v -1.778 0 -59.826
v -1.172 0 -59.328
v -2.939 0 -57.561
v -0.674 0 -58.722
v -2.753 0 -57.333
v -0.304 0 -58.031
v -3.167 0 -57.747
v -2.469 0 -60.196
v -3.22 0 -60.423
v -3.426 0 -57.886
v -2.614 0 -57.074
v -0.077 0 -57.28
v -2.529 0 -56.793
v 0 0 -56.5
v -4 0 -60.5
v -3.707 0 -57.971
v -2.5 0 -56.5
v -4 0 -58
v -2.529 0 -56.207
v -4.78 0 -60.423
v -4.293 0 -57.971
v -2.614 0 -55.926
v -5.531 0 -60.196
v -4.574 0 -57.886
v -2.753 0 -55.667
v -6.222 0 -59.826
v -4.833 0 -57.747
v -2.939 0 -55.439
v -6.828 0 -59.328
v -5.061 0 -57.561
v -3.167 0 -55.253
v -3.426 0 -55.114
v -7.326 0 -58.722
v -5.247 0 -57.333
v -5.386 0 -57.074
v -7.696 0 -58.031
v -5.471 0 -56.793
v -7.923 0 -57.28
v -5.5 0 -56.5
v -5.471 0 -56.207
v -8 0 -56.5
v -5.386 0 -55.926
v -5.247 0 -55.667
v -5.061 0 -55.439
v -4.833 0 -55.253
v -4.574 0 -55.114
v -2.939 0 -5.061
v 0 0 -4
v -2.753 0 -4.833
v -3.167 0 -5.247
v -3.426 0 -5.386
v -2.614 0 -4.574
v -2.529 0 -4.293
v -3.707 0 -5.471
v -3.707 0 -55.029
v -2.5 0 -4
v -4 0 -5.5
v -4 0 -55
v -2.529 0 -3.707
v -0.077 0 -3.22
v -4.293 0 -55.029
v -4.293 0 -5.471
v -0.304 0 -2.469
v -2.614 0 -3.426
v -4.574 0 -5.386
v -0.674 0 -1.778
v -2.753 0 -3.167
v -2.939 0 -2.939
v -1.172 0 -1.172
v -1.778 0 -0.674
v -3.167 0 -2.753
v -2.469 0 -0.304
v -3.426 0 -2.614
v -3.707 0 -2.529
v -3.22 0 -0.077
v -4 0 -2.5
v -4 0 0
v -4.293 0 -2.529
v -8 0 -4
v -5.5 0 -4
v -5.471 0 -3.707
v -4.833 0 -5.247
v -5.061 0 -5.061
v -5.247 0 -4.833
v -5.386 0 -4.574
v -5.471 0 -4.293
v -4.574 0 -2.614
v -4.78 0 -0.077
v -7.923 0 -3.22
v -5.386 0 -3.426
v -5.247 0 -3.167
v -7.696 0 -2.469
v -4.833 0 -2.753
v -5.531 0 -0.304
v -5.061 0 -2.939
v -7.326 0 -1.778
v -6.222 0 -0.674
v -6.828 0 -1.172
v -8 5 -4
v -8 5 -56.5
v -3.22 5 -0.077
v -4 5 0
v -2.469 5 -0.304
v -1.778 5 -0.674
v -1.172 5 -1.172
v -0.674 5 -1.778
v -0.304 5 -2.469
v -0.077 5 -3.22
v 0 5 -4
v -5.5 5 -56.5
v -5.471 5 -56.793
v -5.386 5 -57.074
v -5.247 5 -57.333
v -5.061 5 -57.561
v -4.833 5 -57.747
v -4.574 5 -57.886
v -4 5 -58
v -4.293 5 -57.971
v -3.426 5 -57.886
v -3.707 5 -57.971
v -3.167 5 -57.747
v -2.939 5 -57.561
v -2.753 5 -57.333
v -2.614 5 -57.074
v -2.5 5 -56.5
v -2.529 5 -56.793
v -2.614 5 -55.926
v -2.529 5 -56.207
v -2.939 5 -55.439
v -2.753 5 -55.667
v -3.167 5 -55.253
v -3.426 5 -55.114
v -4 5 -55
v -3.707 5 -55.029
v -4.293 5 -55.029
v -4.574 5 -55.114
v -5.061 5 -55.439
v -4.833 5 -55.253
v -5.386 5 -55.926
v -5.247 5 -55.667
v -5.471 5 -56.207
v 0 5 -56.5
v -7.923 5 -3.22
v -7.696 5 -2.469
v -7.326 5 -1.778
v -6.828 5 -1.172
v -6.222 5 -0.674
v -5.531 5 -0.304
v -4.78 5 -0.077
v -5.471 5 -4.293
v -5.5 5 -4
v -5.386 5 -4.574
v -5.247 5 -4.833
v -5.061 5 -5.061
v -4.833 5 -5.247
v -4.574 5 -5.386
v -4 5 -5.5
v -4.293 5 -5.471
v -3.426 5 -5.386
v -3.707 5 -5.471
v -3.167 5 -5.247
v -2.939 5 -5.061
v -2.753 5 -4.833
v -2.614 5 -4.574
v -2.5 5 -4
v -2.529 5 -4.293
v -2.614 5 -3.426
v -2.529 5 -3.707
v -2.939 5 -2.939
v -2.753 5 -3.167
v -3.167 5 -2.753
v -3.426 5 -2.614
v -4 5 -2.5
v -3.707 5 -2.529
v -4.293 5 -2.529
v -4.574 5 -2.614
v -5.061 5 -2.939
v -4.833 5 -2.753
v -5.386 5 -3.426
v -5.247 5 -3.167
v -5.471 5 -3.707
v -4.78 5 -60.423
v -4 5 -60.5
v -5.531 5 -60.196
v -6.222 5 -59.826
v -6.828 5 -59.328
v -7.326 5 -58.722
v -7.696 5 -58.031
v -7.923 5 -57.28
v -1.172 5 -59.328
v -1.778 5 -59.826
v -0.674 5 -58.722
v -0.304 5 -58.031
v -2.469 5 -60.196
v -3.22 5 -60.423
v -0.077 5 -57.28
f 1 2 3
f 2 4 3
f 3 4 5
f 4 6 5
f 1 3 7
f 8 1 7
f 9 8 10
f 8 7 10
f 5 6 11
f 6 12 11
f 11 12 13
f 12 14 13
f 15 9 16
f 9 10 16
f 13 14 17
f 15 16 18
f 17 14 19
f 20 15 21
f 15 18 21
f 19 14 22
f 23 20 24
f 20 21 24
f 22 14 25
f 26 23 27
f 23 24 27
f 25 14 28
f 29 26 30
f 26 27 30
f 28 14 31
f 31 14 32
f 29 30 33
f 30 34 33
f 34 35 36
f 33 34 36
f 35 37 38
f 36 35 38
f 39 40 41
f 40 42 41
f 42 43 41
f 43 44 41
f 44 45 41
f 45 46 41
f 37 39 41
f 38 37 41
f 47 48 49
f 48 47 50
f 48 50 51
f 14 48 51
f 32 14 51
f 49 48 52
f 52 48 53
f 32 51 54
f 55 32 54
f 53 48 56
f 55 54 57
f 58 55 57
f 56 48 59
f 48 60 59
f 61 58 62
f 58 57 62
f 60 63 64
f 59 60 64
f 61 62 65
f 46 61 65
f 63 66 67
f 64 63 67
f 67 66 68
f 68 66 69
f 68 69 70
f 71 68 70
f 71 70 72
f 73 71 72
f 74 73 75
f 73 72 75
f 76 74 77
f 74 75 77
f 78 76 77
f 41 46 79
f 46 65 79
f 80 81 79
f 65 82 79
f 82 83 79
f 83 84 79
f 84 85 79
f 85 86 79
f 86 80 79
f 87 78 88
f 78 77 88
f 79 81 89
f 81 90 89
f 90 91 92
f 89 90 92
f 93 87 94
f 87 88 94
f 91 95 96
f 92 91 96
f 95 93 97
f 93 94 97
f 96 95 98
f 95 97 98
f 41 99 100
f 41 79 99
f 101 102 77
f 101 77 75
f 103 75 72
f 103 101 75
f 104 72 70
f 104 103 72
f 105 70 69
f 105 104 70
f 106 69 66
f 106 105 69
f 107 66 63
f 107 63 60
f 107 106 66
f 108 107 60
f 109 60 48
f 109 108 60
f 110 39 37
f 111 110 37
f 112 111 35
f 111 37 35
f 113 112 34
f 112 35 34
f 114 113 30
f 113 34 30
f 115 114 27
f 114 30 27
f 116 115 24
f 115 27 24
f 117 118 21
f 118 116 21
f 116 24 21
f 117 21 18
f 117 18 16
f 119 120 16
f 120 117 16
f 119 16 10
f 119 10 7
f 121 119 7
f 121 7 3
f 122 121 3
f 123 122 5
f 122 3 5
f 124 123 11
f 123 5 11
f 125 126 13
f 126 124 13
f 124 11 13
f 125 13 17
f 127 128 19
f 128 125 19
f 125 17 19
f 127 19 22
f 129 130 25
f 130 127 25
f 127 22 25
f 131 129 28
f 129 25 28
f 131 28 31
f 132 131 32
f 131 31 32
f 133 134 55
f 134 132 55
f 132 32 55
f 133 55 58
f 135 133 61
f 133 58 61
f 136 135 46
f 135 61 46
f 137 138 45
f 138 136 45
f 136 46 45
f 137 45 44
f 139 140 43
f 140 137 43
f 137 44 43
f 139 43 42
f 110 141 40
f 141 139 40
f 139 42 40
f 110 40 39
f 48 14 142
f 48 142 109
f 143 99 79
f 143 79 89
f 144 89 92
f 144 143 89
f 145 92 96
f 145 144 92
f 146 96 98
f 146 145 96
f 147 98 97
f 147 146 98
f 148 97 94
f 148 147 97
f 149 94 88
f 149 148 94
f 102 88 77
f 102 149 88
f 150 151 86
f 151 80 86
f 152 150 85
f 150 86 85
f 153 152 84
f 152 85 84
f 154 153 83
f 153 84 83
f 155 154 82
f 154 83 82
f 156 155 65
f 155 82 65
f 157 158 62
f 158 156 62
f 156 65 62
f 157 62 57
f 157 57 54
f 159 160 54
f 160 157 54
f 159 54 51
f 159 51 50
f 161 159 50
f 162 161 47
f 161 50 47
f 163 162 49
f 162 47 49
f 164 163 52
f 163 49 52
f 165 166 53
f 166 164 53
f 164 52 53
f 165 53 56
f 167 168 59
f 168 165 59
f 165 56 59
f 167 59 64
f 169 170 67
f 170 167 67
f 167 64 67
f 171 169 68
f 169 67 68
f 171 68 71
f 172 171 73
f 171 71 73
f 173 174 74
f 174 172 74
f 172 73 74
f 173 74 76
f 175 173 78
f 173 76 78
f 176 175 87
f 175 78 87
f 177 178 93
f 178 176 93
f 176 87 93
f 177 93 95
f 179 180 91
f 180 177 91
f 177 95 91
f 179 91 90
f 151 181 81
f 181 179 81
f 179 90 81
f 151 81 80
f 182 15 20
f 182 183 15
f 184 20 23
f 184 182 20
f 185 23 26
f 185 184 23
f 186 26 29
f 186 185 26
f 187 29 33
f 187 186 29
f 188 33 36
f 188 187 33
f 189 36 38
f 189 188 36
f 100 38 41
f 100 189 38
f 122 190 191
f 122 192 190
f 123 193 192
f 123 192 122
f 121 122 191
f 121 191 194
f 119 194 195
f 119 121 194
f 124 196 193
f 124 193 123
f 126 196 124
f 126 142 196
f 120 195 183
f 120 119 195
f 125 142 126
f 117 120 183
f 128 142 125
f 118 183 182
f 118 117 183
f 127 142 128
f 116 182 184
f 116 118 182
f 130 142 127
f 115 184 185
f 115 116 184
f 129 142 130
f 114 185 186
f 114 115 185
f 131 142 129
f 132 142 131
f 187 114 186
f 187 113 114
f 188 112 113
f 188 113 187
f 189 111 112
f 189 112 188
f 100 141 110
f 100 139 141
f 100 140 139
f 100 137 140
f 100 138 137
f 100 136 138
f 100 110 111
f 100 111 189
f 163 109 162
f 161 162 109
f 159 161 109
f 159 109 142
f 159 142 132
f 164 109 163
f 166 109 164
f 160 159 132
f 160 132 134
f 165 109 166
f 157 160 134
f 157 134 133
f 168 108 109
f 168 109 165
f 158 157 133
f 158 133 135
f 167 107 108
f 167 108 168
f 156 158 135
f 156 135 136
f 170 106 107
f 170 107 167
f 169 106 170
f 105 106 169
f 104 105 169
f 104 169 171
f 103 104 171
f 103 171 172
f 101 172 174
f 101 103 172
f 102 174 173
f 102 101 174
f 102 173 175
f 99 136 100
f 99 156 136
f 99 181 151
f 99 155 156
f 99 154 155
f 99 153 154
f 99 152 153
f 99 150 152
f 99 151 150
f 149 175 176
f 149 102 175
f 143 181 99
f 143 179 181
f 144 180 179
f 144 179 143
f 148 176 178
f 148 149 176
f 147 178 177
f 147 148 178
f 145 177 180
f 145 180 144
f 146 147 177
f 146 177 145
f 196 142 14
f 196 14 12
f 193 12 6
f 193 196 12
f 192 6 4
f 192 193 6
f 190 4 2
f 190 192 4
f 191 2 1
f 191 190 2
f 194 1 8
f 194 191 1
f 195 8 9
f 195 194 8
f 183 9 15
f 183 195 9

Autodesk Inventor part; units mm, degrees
ref_plane "YZ Plane" through (0, 0, 0) normal (1, 0, 0) x (0, 1, 0)
ref_plane "XZ Plane" through (0, 0, 0) normal (0, 1, 0) x (-1, 0, 0)
ref_plane "XY Plane" through (0, 0, 0) normal (0, 0, 1) x (1, 0, 0)
sketch "Esquisse1" plane through (0, 0, 0) normal (0, 1, 0) x (-1, 0, 0)
  line L0 (0, 0) -> (8, 0)
  line L1 (8, 0) -> (8, -60.5)
  line L2 (8, -60.5) -> (0, -60.5)
  line L3 (0, -60.5) -> (0, 0)
  circle A0 centre (4, -4) radius 1.5
  circle A1 centre (4, -56.5) radius 1.5
  dimension "d1" = 8
  dimension "d2" = 3
  dimension "d3" = 4
  dimension "d4" = 4
  dimension "d5" = 4
  dimension "d6" = 4
  dimension "d7" = 3
  dimension "d11" = 52.5
extrude "Extrusion1" add sketch "Esquisse1" along normal blind 5
fillet "Congé1" radius 4 4 edges at (-8, 2.5, 0) (0, 2.5, 0) (0, 2.5, -60.5) (-8, 2.5, -60.5)
equation "\"d3\" = 0.5 * d1"
equation "\"d4\" = d3"
equation "\"d5\" = d3"
equation "\"d6\" = d5"
equation "\"d7\" = d2"
properties part number "biellette1" material "Acier inoxydable"
